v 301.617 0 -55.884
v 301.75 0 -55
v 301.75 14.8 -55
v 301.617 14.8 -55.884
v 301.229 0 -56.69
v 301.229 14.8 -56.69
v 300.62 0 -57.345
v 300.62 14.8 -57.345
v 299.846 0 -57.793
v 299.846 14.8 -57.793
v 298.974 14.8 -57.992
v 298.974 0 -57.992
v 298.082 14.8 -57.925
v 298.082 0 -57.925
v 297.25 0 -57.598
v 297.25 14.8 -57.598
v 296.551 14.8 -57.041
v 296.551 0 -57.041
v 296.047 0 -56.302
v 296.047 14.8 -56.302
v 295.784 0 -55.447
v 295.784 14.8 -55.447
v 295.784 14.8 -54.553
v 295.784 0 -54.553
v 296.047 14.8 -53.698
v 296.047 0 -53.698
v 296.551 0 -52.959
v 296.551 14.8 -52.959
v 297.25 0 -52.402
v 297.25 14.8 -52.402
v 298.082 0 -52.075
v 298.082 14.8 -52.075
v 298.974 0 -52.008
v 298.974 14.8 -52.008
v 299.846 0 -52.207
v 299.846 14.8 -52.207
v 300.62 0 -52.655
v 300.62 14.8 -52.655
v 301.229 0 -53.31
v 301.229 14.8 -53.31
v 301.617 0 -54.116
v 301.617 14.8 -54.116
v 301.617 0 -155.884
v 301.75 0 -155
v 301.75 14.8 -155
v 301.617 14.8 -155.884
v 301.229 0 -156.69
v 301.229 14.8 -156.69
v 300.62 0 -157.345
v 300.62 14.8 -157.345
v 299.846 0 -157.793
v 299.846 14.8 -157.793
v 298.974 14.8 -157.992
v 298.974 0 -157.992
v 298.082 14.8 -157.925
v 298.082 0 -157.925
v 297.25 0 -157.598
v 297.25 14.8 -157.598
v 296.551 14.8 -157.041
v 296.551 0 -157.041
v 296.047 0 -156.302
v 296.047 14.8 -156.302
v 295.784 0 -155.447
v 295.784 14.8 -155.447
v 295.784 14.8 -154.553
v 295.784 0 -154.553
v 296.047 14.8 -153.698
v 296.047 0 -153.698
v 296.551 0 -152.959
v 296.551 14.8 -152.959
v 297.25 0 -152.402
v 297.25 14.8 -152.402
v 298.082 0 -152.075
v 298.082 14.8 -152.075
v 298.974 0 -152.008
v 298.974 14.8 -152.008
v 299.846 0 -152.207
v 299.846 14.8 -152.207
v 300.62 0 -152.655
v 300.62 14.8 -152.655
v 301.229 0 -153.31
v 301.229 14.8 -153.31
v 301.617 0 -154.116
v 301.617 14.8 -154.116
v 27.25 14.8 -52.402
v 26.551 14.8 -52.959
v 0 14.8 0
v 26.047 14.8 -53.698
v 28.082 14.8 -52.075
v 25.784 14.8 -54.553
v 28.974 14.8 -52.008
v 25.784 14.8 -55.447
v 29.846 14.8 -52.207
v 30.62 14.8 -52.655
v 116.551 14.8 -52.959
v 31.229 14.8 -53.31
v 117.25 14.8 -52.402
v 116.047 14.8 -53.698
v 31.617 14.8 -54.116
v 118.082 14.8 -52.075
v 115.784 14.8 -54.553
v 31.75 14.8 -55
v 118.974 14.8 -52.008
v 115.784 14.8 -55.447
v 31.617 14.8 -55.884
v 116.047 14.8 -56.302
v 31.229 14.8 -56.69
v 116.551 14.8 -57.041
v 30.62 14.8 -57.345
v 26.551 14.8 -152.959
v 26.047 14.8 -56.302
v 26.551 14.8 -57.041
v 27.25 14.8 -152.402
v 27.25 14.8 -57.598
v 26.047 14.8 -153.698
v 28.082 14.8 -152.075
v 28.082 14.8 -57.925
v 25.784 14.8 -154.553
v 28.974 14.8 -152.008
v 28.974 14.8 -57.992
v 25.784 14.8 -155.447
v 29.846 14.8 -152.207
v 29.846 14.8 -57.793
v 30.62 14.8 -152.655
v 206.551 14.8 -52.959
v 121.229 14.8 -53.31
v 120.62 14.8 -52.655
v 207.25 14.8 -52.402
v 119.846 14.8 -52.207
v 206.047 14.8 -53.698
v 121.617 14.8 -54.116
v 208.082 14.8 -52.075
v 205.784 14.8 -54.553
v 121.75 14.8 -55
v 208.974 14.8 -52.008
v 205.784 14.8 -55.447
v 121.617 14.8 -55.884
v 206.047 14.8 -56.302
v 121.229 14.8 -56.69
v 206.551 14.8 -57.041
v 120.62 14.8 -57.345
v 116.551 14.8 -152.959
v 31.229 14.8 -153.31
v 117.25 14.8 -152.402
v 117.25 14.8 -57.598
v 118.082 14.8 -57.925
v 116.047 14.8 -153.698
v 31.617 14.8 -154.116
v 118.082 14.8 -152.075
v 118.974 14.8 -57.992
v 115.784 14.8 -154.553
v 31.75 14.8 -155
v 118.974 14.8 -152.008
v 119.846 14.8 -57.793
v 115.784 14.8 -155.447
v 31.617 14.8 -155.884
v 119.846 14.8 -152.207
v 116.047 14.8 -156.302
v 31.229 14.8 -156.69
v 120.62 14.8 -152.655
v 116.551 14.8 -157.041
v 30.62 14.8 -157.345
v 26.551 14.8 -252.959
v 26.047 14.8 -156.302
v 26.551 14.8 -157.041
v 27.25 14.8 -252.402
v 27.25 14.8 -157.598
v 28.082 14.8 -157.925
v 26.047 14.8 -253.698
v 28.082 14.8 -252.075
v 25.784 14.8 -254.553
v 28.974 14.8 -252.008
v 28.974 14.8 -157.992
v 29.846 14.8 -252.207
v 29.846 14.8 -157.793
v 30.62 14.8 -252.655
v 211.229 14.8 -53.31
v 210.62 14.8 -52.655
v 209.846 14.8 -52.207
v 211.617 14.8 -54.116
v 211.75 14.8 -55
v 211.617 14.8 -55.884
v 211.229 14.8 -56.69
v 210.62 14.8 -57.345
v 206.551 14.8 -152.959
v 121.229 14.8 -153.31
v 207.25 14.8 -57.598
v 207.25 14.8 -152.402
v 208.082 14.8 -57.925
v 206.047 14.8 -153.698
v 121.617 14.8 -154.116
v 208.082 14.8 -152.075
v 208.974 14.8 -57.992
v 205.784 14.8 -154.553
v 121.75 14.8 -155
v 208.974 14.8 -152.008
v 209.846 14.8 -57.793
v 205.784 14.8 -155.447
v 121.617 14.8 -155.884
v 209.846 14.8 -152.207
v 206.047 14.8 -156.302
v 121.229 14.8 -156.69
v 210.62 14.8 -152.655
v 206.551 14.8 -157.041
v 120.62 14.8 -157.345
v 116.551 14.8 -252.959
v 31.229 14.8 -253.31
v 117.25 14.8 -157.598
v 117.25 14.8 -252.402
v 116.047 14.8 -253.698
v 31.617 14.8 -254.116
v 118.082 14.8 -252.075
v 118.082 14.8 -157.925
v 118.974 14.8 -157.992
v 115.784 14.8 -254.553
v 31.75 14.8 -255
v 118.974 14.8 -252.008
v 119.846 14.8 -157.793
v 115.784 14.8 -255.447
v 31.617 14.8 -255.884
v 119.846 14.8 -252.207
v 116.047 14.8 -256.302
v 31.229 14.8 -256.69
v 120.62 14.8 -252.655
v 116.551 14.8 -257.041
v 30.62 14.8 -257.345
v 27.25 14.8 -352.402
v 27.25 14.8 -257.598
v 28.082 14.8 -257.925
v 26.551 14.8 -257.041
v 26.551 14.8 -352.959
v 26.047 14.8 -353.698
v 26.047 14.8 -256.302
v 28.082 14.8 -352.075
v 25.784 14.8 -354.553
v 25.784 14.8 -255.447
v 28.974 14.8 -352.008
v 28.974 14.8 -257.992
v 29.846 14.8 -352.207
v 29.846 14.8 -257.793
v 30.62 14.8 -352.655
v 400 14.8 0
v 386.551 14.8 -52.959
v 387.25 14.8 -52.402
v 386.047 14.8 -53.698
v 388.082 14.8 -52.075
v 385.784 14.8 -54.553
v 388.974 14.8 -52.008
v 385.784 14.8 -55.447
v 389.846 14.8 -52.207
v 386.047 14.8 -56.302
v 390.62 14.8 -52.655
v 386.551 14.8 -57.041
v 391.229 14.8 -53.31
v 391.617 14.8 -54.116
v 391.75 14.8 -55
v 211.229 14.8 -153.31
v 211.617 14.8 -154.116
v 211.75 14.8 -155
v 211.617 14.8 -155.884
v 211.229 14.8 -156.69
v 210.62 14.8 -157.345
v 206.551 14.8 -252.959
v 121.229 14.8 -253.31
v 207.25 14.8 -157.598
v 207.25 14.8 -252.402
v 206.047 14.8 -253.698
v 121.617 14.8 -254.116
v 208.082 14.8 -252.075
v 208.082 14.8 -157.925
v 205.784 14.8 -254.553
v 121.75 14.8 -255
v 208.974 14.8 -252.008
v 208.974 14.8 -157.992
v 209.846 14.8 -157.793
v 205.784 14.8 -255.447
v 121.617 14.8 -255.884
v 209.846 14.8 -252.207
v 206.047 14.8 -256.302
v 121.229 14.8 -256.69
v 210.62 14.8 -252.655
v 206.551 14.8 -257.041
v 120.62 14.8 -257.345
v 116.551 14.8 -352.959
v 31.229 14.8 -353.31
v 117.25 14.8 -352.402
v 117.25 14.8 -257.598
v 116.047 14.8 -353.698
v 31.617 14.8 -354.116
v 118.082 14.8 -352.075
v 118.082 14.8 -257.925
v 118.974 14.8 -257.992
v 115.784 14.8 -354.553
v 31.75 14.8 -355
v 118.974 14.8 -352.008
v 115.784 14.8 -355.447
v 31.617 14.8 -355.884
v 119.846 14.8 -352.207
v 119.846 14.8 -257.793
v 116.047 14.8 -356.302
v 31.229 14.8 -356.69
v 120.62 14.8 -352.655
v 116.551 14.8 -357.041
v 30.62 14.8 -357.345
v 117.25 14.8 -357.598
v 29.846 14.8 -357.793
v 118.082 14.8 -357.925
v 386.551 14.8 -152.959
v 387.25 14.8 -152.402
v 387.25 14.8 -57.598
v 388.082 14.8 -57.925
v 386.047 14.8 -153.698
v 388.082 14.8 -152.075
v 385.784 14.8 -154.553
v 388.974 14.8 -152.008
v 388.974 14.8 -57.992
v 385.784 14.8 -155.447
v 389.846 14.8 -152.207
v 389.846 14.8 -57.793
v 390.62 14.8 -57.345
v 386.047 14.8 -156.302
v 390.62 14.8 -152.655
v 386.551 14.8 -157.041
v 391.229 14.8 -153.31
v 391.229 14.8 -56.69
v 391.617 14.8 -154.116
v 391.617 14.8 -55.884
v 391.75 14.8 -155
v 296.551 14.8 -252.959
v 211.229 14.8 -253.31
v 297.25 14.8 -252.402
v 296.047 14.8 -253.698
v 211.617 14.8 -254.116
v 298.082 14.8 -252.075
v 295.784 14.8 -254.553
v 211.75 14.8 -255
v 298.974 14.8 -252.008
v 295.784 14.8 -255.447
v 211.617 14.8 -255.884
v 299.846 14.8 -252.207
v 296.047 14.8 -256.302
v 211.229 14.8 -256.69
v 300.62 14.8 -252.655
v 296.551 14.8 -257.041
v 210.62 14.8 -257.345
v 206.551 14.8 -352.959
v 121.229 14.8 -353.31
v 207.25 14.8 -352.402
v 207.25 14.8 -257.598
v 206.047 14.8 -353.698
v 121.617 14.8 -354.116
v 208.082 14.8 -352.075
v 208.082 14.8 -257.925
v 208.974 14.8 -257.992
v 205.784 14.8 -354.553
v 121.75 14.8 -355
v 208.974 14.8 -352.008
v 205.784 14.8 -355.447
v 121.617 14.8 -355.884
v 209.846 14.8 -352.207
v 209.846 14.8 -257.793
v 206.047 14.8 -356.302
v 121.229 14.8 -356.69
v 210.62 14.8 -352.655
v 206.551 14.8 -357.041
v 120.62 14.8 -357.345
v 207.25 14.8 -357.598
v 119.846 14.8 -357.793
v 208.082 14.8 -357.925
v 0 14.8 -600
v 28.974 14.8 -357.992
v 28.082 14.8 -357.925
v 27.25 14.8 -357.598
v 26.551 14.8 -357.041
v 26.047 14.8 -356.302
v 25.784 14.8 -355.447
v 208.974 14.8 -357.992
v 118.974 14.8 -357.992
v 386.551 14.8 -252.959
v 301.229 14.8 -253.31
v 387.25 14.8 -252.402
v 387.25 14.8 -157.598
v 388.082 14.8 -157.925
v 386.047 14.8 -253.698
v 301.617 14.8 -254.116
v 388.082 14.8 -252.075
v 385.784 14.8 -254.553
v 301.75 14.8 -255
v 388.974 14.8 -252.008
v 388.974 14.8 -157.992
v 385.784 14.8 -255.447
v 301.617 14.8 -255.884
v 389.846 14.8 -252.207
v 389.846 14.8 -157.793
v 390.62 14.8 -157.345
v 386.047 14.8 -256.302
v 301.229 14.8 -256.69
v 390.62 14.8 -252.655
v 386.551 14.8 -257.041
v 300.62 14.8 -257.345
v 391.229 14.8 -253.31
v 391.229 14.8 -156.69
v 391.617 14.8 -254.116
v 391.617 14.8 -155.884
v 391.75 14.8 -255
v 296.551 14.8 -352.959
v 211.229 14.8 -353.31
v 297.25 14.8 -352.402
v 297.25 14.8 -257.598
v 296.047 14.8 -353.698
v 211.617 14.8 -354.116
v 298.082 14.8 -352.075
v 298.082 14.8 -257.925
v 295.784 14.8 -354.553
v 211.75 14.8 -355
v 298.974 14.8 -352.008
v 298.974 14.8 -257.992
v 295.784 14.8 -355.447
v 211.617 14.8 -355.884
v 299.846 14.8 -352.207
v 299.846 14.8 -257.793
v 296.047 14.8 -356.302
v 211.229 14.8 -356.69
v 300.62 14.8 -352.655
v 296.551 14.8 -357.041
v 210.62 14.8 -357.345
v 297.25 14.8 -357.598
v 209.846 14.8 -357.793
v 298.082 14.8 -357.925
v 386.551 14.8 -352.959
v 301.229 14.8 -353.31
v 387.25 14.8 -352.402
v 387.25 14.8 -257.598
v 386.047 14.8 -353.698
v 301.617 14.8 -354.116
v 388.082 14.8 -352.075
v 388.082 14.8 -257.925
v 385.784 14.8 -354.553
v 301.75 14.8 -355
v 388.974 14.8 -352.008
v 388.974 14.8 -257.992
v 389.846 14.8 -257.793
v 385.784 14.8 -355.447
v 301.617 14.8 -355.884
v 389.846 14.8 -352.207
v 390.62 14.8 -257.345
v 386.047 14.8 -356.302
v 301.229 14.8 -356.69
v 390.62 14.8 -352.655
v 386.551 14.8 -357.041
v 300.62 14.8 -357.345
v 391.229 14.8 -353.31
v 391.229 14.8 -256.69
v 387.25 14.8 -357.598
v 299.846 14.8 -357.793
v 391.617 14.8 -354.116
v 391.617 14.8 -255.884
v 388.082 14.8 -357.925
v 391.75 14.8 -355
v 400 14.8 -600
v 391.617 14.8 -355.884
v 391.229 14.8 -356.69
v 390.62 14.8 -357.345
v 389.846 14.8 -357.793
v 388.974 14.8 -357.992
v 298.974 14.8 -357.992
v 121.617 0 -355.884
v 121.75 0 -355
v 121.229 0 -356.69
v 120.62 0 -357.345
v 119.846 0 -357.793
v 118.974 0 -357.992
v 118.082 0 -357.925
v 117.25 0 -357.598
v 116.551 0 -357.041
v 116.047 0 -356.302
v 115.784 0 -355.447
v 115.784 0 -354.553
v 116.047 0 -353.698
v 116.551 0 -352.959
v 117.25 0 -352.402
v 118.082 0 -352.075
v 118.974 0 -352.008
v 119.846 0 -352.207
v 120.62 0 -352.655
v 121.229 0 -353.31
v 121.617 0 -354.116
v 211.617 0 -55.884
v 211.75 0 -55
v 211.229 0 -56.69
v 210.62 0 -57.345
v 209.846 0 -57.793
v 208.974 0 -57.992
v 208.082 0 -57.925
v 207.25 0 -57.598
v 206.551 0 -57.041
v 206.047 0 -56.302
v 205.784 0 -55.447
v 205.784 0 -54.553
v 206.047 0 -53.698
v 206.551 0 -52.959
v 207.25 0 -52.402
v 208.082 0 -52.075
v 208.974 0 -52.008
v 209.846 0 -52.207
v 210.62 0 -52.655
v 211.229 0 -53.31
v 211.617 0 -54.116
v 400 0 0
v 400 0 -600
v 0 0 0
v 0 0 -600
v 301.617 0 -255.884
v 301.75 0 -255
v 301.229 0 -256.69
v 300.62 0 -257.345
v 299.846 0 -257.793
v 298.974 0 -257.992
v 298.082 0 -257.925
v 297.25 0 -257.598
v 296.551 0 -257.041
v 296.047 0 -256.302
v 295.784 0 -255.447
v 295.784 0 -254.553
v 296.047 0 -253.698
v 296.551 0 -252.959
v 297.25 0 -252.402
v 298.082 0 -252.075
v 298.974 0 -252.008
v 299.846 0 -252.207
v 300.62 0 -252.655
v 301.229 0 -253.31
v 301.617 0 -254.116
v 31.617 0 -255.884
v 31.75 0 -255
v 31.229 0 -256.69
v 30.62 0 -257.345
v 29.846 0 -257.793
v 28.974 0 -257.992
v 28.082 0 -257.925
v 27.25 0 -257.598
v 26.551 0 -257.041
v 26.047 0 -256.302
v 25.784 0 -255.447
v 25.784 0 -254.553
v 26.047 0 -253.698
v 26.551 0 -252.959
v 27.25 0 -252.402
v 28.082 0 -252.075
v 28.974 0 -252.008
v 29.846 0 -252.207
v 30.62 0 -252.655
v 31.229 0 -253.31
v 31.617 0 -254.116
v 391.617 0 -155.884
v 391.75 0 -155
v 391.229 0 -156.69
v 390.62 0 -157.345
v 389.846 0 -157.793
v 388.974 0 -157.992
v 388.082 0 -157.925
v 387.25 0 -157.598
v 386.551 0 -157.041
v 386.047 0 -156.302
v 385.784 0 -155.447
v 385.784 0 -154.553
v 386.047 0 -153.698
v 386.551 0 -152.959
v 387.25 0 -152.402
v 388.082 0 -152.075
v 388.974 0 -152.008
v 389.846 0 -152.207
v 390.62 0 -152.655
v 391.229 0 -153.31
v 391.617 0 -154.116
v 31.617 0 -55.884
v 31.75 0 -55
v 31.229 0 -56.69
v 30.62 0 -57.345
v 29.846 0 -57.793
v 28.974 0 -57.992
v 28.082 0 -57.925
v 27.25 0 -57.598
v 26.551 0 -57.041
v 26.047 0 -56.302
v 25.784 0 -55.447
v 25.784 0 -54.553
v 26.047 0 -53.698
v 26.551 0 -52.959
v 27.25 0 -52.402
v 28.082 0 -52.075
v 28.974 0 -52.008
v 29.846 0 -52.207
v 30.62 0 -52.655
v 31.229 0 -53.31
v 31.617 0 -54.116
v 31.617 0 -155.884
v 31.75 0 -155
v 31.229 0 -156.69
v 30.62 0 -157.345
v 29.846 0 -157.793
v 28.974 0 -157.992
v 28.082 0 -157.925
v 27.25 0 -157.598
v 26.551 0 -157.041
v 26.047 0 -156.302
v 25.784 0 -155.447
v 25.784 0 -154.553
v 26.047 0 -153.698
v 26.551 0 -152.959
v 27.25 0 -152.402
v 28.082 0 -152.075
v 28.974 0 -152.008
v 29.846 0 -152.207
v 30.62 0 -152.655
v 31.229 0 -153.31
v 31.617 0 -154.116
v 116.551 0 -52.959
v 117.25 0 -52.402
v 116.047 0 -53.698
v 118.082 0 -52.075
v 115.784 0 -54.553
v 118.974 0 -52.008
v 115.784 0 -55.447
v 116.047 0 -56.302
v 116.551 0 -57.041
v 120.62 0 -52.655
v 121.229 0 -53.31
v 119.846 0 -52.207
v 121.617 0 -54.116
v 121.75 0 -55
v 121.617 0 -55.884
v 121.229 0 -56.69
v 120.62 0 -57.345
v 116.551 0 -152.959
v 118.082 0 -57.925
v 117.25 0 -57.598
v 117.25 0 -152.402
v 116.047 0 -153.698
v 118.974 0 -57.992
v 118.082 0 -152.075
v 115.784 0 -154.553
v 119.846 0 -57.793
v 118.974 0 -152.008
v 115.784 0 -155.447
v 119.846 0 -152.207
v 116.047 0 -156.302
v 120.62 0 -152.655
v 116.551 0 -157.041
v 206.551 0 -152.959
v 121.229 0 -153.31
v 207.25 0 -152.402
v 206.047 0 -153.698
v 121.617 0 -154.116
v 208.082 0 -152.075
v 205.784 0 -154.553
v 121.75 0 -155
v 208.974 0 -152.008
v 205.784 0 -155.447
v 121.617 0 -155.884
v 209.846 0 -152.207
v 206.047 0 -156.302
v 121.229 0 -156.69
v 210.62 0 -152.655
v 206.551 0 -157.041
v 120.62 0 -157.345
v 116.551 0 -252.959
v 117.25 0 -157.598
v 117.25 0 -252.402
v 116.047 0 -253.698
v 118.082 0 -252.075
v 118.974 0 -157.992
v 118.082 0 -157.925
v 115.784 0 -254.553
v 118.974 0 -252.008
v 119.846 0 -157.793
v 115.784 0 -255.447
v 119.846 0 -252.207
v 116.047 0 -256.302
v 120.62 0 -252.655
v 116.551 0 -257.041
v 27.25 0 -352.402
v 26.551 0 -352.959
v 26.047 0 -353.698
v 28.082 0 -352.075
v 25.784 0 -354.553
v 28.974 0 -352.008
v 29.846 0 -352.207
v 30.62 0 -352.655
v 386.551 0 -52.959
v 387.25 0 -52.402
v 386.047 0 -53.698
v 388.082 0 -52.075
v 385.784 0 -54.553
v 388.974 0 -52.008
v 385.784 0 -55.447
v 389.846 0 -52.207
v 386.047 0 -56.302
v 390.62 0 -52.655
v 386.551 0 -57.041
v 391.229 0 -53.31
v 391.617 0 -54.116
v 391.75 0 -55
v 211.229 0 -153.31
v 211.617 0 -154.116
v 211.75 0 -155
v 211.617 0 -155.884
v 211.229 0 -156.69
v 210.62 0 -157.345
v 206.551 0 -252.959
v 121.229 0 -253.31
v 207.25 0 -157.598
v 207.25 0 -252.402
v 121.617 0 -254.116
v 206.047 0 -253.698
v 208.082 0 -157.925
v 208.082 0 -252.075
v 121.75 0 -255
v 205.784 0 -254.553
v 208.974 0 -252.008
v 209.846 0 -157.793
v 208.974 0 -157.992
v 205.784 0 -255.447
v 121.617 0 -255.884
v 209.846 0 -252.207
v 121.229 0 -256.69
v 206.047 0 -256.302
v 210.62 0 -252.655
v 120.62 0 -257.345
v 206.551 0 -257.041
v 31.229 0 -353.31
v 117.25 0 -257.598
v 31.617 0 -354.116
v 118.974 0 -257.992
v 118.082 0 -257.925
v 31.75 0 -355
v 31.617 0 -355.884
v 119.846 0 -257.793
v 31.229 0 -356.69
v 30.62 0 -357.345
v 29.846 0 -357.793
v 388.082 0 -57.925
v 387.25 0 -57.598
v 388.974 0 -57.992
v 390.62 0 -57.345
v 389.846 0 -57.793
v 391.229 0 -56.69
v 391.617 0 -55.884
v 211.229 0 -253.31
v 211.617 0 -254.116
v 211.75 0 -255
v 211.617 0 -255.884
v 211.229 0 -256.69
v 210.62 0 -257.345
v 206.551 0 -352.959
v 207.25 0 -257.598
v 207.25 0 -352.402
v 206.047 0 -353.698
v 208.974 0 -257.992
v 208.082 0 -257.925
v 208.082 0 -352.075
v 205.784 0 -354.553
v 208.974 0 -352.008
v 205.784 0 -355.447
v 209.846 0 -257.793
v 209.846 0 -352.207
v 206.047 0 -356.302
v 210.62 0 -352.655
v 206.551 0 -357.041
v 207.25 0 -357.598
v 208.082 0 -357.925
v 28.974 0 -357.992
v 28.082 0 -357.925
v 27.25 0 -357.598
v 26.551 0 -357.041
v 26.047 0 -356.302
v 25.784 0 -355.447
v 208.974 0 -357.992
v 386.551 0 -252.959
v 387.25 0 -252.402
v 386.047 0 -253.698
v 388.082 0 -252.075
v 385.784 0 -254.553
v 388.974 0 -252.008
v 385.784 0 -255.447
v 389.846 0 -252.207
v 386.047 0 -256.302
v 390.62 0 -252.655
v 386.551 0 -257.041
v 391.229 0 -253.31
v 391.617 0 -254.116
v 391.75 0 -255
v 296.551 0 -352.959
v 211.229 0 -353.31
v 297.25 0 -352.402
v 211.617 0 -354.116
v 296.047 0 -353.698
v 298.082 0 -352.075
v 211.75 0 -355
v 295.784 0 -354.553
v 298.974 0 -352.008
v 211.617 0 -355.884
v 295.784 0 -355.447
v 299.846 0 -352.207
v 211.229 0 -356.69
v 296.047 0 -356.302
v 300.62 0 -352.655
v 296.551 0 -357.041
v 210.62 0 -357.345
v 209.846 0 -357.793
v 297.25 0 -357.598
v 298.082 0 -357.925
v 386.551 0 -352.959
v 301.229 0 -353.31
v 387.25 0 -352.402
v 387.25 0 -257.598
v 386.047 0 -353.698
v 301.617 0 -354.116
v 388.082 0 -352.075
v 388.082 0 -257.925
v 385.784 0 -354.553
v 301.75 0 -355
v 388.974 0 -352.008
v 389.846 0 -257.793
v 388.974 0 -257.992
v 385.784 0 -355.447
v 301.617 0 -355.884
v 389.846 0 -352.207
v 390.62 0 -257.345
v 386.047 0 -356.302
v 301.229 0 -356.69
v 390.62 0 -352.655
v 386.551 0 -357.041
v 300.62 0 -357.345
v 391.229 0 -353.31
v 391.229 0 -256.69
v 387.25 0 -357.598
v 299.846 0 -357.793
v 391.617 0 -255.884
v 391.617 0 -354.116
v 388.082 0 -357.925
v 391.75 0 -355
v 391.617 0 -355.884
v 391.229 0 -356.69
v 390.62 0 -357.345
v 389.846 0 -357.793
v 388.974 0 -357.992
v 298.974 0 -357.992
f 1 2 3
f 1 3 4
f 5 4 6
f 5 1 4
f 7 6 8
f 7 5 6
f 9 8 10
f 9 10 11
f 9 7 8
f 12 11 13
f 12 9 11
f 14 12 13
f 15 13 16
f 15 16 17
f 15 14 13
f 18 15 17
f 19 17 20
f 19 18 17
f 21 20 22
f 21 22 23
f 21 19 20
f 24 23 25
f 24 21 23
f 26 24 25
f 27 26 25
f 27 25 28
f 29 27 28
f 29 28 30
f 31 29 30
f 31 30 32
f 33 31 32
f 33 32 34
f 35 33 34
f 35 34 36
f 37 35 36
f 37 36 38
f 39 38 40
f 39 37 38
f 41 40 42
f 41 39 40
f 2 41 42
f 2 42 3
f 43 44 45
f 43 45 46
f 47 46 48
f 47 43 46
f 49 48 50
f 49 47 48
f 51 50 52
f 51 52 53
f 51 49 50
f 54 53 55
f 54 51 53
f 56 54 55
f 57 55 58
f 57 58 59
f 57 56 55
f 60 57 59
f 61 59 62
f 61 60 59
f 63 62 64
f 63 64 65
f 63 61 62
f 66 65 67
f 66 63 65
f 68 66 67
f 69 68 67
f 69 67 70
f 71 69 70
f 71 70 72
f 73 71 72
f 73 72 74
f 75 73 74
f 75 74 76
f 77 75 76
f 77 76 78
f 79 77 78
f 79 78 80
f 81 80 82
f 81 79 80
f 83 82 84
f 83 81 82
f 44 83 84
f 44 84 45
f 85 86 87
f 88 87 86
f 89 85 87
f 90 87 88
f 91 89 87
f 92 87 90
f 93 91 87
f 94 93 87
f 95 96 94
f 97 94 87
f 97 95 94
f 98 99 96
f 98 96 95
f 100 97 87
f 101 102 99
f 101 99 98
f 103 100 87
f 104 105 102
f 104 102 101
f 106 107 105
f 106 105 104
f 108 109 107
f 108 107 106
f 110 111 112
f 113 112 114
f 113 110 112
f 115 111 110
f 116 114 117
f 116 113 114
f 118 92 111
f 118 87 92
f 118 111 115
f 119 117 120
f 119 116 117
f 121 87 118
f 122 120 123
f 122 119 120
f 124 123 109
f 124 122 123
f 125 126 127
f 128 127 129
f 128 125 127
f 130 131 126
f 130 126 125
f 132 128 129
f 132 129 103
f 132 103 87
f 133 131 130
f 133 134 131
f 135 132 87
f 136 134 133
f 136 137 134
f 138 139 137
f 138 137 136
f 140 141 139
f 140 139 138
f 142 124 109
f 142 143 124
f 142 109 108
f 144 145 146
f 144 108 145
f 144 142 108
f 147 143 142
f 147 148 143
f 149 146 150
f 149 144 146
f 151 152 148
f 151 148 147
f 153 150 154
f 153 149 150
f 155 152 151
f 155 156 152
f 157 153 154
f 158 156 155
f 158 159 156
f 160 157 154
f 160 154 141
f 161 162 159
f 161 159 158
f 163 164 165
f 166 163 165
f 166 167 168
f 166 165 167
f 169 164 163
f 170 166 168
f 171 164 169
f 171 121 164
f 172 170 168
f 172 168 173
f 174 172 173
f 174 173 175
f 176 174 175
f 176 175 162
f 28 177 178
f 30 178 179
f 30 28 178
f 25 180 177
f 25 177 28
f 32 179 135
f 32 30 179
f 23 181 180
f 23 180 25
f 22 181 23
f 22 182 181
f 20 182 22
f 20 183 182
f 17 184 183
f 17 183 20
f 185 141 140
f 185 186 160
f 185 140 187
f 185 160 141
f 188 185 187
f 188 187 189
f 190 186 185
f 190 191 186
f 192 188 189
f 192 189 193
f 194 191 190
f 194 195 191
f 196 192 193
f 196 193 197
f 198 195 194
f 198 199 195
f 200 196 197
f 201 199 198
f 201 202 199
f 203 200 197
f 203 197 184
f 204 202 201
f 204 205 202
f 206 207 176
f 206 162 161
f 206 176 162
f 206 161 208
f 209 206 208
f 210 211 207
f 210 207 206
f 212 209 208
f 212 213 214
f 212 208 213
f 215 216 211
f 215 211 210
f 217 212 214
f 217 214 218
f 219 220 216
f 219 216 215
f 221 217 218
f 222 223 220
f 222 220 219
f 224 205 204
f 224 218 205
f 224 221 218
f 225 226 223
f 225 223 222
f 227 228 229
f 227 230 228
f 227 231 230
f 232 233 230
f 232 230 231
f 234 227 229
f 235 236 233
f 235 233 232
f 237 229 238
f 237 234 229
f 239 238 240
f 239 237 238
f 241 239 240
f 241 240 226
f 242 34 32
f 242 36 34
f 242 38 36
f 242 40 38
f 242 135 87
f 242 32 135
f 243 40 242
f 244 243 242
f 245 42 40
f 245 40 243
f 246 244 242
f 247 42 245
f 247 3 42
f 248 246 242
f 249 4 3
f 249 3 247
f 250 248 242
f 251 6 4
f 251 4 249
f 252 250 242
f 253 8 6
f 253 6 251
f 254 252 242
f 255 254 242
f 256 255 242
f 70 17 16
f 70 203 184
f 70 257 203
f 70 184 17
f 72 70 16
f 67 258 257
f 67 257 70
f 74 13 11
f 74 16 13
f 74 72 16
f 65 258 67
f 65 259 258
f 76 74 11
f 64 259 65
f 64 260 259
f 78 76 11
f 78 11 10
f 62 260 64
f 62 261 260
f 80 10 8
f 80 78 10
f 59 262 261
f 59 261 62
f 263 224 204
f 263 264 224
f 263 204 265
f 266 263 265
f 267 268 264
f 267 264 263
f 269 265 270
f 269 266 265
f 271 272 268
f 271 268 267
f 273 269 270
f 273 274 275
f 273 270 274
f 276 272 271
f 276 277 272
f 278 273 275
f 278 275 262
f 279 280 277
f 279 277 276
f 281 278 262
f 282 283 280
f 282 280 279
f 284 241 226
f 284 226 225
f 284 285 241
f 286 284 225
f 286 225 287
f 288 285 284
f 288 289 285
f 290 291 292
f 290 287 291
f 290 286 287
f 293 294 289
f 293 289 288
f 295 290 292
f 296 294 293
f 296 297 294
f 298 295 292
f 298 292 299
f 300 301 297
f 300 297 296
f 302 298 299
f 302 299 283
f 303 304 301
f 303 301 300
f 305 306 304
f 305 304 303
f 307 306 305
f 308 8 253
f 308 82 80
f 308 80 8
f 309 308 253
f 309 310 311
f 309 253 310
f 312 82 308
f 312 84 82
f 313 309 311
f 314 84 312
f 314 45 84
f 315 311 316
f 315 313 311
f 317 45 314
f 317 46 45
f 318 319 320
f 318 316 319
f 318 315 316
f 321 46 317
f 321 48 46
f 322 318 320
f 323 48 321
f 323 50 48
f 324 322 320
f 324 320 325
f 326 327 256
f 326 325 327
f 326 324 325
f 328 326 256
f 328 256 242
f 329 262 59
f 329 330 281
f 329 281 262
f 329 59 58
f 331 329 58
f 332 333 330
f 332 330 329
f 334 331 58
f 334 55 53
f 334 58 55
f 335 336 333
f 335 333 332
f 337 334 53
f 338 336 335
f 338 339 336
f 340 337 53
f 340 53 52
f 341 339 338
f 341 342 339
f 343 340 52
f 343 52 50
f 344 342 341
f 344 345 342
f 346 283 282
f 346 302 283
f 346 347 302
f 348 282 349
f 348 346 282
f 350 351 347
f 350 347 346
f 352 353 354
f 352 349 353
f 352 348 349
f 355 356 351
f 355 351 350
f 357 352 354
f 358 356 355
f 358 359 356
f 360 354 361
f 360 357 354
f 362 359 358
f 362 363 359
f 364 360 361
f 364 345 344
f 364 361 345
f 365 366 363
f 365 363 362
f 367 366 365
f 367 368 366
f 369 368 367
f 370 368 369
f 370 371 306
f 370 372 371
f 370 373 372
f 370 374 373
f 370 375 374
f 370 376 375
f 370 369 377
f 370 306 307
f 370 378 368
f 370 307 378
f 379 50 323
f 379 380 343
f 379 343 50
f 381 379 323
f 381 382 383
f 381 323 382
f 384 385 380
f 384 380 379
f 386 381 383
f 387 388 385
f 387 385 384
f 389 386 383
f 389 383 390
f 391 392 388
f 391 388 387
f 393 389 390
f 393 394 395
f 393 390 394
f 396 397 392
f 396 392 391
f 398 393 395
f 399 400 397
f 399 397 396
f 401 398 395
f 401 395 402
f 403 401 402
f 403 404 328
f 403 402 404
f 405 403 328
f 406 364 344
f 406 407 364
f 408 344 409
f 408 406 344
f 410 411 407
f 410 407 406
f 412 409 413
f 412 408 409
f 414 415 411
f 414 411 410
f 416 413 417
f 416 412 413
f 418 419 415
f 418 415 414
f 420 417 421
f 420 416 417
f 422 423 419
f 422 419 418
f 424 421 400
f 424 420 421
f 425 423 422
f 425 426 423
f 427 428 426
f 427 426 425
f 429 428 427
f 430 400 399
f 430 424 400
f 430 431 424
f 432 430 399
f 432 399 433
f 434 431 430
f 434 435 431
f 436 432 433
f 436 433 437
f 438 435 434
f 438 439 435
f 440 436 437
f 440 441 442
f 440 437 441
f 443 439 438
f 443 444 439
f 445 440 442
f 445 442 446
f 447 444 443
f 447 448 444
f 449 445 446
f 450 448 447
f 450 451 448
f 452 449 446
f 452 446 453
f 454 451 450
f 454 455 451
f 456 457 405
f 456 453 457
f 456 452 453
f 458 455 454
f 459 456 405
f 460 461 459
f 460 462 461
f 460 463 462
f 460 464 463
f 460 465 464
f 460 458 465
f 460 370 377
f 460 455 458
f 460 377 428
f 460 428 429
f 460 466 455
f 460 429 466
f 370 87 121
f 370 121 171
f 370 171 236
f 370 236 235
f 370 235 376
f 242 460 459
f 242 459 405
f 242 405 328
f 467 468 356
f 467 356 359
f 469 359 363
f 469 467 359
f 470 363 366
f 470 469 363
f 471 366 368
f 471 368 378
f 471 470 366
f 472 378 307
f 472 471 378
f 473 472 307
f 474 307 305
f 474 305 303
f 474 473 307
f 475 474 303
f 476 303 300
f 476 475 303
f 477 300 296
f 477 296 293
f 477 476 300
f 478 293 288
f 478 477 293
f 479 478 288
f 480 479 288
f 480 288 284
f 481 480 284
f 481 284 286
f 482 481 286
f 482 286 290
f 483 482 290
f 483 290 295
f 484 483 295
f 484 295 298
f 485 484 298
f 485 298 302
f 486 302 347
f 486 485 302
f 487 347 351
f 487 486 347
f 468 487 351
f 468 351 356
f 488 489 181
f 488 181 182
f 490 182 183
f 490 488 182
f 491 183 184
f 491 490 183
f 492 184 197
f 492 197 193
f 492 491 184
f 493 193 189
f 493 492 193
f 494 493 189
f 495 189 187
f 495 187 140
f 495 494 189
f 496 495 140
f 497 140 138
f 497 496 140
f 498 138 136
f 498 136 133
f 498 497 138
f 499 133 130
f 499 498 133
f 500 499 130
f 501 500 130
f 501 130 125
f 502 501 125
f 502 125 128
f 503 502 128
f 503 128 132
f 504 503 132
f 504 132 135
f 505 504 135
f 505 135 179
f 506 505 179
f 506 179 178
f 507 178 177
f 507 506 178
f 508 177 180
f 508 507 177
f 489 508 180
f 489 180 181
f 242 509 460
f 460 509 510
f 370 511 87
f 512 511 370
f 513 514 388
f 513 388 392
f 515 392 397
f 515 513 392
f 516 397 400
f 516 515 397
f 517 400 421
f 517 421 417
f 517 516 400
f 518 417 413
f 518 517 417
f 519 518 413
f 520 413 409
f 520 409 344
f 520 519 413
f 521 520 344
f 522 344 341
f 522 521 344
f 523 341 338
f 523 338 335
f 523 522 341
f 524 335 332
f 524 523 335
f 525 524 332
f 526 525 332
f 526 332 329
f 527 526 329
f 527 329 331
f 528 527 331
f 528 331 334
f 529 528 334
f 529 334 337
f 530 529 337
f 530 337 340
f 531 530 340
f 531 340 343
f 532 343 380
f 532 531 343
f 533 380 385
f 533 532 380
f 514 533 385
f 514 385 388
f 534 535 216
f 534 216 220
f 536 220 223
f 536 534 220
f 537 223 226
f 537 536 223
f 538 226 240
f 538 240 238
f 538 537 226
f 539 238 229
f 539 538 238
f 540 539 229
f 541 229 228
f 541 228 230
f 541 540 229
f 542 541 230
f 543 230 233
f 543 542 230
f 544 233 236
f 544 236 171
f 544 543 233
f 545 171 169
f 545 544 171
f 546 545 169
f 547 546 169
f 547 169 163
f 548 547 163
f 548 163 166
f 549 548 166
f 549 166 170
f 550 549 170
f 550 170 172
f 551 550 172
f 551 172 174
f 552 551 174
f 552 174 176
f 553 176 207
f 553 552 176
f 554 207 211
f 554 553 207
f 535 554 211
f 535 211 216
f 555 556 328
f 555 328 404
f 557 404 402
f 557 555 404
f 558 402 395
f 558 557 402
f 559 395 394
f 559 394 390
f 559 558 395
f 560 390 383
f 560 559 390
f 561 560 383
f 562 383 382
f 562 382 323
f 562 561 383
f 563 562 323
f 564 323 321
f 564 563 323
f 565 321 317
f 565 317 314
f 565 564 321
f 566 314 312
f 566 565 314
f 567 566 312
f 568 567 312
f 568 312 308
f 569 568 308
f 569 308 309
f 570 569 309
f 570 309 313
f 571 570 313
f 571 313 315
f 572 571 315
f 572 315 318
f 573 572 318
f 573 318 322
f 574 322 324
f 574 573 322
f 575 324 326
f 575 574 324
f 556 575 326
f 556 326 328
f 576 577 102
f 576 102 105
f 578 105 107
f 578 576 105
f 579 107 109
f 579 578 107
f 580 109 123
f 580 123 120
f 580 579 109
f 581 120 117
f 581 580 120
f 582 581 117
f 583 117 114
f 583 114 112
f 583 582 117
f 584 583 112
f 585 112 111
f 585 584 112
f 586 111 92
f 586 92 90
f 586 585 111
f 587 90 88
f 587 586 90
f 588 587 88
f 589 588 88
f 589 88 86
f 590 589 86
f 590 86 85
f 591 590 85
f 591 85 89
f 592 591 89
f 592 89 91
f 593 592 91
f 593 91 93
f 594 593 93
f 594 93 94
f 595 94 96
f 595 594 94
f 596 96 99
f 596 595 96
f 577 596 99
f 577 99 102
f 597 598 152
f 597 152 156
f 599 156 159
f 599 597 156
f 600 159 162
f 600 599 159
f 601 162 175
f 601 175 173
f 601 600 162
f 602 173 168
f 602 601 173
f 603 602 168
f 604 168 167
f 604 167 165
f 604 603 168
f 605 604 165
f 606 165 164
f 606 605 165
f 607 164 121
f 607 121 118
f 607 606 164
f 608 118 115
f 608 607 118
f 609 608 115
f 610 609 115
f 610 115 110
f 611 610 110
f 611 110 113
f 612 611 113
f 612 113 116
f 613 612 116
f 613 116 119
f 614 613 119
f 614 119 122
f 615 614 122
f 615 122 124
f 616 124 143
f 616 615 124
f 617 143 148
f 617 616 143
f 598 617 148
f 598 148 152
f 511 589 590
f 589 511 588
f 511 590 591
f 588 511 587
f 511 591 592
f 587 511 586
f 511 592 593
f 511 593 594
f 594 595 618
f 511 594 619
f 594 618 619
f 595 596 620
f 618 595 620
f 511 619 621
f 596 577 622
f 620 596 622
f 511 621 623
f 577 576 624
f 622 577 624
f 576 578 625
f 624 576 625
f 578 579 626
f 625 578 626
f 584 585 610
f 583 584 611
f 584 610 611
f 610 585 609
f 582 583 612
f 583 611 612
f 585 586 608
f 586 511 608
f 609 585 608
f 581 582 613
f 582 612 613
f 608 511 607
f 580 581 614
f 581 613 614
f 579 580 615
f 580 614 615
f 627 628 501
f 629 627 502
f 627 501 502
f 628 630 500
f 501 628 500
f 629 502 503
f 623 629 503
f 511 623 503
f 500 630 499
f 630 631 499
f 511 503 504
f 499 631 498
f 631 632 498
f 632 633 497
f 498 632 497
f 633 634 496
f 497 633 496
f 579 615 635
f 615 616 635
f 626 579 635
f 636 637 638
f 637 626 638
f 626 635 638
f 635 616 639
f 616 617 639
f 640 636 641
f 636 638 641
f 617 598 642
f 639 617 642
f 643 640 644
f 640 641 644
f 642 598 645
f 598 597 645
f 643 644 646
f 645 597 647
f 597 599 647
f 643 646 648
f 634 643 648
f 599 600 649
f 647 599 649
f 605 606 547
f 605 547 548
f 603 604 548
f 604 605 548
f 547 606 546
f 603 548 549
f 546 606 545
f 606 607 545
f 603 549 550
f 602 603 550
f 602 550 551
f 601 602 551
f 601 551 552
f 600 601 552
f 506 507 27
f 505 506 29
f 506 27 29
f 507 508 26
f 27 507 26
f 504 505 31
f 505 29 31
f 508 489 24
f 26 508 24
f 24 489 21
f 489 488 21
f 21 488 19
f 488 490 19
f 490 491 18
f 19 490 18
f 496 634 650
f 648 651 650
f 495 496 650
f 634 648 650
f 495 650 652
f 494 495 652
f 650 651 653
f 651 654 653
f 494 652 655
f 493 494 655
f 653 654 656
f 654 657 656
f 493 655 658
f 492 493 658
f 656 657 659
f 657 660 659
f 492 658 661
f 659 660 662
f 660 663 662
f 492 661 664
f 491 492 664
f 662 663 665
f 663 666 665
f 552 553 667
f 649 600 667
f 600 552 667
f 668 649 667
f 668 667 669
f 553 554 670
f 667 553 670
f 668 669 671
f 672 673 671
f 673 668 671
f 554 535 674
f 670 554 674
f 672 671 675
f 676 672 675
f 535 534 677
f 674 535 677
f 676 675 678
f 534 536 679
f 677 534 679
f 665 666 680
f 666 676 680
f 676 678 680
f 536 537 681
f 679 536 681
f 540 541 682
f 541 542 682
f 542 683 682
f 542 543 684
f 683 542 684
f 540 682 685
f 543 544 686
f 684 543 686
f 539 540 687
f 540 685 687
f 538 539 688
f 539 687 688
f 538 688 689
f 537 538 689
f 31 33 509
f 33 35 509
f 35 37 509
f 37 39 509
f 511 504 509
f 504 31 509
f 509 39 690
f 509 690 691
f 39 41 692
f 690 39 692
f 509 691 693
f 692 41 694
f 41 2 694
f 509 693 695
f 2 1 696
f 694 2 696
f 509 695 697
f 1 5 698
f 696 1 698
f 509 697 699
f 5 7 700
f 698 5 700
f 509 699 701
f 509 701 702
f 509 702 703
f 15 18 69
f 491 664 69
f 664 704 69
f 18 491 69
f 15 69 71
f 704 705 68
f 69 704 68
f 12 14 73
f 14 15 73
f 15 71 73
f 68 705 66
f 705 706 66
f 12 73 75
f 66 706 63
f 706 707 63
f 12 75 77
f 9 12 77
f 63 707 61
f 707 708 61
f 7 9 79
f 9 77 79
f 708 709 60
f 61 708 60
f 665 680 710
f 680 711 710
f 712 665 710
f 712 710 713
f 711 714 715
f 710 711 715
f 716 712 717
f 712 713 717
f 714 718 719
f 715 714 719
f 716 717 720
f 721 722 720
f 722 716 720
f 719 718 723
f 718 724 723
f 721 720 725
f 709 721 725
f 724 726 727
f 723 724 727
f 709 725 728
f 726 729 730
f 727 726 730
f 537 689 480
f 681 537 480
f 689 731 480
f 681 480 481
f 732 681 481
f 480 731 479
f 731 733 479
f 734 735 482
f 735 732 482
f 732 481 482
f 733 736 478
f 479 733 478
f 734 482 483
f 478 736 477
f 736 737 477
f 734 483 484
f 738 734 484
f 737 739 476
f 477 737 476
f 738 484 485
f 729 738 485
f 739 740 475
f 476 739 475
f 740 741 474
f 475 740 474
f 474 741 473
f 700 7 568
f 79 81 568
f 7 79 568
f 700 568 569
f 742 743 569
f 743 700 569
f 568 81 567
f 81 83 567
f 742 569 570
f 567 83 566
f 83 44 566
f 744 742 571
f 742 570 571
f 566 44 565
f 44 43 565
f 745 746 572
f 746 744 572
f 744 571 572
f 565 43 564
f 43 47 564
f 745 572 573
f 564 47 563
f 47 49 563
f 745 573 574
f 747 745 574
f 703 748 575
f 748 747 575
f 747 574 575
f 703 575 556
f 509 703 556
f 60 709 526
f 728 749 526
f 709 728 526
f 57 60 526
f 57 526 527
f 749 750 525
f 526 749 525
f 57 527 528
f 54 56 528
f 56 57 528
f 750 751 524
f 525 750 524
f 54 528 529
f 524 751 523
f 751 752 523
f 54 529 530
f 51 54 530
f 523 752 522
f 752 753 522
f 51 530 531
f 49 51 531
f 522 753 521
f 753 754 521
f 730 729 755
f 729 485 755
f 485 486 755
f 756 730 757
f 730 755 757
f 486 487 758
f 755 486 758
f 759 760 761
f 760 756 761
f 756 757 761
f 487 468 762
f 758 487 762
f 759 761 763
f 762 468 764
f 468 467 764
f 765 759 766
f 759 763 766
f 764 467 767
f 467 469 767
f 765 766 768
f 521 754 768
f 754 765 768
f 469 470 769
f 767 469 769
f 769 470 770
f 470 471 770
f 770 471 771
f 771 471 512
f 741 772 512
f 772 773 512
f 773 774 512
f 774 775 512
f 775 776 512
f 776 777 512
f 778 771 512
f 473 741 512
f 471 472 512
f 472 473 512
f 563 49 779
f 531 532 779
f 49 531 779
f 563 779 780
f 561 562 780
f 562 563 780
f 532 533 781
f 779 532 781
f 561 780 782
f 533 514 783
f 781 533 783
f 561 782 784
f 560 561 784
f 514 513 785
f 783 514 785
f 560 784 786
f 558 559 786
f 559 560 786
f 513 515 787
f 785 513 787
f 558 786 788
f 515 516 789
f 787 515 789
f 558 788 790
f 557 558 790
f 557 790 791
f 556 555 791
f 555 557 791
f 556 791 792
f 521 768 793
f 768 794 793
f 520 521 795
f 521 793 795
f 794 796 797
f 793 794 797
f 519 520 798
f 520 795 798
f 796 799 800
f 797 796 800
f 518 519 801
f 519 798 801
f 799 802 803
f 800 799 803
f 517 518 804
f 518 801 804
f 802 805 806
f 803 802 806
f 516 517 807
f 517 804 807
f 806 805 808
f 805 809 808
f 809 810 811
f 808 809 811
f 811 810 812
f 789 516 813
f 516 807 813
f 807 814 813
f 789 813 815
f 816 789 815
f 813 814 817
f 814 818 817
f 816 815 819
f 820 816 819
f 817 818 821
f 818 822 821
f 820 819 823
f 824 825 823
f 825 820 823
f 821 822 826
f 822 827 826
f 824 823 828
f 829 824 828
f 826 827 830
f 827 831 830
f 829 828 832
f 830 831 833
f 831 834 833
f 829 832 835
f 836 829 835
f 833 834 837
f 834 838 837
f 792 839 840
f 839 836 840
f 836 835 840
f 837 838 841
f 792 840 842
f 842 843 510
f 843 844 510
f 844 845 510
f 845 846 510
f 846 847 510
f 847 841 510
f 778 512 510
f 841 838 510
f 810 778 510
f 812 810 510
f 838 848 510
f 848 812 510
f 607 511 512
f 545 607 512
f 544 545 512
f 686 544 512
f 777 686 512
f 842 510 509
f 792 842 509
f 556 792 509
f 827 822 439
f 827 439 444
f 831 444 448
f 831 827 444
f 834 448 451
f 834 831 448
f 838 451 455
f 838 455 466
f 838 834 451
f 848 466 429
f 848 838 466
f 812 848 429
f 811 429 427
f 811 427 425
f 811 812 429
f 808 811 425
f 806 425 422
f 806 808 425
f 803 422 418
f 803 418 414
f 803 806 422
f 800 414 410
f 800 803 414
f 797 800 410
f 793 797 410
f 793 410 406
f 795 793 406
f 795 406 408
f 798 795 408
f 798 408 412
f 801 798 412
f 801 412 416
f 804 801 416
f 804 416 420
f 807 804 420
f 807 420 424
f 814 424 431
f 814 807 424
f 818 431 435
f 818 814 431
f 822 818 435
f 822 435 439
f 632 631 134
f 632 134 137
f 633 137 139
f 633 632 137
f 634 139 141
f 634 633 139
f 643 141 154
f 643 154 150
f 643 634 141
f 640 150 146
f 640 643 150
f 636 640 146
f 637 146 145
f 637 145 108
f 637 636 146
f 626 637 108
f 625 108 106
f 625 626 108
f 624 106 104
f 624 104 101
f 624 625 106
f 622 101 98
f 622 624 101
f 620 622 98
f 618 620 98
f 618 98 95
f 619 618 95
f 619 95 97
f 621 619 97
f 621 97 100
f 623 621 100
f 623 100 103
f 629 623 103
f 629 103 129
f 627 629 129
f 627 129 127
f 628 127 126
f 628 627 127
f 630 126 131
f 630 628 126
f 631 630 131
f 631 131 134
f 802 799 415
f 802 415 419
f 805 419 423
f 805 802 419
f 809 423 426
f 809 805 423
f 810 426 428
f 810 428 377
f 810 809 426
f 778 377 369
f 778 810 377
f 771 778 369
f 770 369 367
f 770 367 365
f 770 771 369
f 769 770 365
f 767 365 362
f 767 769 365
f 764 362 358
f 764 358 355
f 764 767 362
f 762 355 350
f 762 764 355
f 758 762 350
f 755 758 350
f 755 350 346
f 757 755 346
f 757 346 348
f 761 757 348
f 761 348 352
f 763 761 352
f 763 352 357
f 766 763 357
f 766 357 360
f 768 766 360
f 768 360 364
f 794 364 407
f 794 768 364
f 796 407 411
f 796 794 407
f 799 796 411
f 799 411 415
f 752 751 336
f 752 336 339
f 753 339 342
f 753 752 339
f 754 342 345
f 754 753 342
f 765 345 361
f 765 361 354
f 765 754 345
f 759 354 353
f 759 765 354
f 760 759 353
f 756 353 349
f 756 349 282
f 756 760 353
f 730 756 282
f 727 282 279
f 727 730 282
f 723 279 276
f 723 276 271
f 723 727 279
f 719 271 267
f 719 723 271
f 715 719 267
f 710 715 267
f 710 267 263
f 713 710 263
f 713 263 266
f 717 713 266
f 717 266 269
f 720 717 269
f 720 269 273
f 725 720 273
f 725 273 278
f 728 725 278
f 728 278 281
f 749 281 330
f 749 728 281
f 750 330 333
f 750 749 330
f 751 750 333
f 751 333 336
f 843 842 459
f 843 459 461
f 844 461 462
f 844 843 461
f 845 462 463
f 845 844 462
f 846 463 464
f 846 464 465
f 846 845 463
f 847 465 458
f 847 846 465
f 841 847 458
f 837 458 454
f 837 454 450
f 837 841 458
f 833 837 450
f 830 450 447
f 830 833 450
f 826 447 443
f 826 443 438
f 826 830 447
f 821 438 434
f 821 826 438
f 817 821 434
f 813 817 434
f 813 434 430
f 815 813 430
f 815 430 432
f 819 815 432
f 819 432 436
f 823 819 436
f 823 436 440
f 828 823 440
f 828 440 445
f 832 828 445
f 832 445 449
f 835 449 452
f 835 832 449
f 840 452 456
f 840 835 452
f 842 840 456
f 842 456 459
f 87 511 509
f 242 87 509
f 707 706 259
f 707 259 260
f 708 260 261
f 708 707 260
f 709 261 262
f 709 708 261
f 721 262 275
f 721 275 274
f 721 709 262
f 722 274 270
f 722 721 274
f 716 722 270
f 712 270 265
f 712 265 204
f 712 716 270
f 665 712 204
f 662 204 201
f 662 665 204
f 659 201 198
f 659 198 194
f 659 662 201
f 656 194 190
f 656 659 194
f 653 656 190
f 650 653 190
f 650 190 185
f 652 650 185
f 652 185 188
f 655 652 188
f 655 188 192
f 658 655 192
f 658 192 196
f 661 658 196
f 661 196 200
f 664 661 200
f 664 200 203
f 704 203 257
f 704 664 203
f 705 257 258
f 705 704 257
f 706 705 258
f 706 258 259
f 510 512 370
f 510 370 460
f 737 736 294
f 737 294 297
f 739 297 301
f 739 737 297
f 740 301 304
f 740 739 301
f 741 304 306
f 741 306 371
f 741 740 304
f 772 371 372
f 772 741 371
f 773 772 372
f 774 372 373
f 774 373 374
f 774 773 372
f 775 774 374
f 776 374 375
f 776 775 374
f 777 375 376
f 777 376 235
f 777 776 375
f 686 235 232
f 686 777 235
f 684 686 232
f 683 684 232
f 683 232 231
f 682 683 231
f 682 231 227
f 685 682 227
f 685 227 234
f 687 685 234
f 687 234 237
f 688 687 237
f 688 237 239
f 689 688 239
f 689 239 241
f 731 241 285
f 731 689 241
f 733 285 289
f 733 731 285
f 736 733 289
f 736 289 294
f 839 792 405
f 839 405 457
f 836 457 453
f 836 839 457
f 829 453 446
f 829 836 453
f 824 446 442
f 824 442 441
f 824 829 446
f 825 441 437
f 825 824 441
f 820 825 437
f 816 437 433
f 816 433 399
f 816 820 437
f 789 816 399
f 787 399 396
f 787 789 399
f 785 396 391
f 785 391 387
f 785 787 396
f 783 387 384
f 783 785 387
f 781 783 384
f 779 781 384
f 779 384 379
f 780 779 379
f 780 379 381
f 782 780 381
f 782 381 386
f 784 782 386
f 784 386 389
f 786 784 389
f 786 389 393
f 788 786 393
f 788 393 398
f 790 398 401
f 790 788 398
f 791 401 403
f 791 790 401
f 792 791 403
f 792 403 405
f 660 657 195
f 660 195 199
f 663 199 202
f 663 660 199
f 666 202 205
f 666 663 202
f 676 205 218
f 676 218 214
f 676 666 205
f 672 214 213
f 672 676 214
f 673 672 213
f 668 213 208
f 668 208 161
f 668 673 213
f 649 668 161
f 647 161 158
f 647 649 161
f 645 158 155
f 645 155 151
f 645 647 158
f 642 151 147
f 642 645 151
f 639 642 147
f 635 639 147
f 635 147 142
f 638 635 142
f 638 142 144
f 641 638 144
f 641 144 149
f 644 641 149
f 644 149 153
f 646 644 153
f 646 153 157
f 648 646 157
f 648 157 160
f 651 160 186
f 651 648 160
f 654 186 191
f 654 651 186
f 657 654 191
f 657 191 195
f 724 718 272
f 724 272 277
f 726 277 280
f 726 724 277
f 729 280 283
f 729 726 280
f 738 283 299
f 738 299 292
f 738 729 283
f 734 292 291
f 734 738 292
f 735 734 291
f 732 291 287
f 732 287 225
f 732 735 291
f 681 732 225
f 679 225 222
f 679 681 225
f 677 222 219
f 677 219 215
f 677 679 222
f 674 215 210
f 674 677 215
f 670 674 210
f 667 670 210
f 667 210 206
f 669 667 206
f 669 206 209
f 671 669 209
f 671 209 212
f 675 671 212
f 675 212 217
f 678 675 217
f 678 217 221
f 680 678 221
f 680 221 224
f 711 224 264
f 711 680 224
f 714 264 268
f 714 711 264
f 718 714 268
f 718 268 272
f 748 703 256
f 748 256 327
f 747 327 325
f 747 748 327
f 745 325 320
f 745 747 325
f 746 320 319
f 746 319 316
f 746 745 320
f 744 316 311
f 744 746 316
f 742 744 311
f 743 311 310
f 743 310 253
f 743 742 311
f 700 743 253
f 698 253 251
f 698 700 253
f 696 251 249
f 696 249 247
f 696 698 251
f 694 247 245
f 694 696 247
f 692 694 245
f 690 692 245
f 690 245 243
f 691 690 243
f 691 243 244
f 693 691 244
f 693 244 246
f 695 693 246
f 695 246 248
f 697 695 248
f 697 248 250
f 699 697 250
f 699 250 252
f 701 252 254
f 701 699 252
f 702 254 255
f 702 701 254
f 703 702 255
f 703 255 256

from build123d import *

# Parameters (mm, degrees)
SKETCH1_W           = 400
SKETCH1_H           = 600
SKETCH1_R           = 3
BOSS_EXTRUDE1_DEPTH = 14.8


with BuildPart() as part:
    # Sketch1 → Boss-Extrude1 (new body)
    with BuildSketch(Plane(origin=(0, 0, 0), x_dir=(1, 0, 0), z_dir=(0, 1, 0))):
        with Locations((200, 300)):
            Rectangle(SKETCH1_W, SKETCH1_H)
        with Locations((28.75, 355)):
            Circle(SKETCH1_R, mode=Mode.SUBTRACT)
        with Locations((118.75, 355)):
            Circle(SKETCH1_R, mode=Mode.SUBTRACT)
        with Locations((208.75, 355)):
            Circle(SKETCH1_R, mode=Mode.SUBTRACT)
        with Locations((298.75, 355)):
            Circle(SKETCH1_R, mode=Mode.SUBTRACT)
        with Locations((388.75, 355)):
            Circle(SKETCH1_R, mode=Mode.SUBTRACT)
        with Locations((28.75, 255)):
            Circle(SKETCH1_R, mode=Mode.SUBTRACT)
        with Locations((118.75, 255)):
            Circle(SKETCH1_R, mode=Mode.SUBTRACT)
        with Locations((208.75, 255)):
            Circle(SKETCH1_R, mode=Mode.SUBTRACT)
        with Locations((298.75, 255)):
            Circle(SKETCH1_R, mode=Mode.SUBTRACT)
        with Locations((388.75, 255)):
            Circle(SKETCH1_R, mode=Mode.SUBTRACT)
        with Locations((28.75, 155)):
            Circle(SKETCH1_R, mode=Mode.SUBTRACT)
        with Locations((118.75, 155)):
            Circle(SKETCH1_R, mode=Mode.SUBTRACT)
        with Locations((208.75, 155)):
            Circle(SKETCH1_R, mode=Mode.SUBTRACT)
        with Locations((298.75, 155)):
            Circle(SKETCH1_R, mode=Mode.SUBTRACT)
        with Locations((388.75, 155)):
            Circle(SKETCH1_R, mode=Mode.SUBTRACT)
        with Locations((28.75, 55)):
            Circle(SKETCH1_R, mode=Mode.SUBTRACT)
        with Locations((118.75, 55)):
            Circle(SKETCH1_R, mode=Mode.SUBTRACT)
        with Locations((208.75, 55)):
            Circle(SKETCH1_R, mode=Mode.SUBTRACT)
        with Locations((298.75, 55)):
            Circle(SKETCH1_R, mode=Mode.SUBTRACT)
        with Locations((388.75, 55)):
            Circle(SKETCH1_R, mode=Mode.SUBTRACT)
    extrude(amount=BOSS_EXTRUDE1_DEPTH)


solid = part.part
